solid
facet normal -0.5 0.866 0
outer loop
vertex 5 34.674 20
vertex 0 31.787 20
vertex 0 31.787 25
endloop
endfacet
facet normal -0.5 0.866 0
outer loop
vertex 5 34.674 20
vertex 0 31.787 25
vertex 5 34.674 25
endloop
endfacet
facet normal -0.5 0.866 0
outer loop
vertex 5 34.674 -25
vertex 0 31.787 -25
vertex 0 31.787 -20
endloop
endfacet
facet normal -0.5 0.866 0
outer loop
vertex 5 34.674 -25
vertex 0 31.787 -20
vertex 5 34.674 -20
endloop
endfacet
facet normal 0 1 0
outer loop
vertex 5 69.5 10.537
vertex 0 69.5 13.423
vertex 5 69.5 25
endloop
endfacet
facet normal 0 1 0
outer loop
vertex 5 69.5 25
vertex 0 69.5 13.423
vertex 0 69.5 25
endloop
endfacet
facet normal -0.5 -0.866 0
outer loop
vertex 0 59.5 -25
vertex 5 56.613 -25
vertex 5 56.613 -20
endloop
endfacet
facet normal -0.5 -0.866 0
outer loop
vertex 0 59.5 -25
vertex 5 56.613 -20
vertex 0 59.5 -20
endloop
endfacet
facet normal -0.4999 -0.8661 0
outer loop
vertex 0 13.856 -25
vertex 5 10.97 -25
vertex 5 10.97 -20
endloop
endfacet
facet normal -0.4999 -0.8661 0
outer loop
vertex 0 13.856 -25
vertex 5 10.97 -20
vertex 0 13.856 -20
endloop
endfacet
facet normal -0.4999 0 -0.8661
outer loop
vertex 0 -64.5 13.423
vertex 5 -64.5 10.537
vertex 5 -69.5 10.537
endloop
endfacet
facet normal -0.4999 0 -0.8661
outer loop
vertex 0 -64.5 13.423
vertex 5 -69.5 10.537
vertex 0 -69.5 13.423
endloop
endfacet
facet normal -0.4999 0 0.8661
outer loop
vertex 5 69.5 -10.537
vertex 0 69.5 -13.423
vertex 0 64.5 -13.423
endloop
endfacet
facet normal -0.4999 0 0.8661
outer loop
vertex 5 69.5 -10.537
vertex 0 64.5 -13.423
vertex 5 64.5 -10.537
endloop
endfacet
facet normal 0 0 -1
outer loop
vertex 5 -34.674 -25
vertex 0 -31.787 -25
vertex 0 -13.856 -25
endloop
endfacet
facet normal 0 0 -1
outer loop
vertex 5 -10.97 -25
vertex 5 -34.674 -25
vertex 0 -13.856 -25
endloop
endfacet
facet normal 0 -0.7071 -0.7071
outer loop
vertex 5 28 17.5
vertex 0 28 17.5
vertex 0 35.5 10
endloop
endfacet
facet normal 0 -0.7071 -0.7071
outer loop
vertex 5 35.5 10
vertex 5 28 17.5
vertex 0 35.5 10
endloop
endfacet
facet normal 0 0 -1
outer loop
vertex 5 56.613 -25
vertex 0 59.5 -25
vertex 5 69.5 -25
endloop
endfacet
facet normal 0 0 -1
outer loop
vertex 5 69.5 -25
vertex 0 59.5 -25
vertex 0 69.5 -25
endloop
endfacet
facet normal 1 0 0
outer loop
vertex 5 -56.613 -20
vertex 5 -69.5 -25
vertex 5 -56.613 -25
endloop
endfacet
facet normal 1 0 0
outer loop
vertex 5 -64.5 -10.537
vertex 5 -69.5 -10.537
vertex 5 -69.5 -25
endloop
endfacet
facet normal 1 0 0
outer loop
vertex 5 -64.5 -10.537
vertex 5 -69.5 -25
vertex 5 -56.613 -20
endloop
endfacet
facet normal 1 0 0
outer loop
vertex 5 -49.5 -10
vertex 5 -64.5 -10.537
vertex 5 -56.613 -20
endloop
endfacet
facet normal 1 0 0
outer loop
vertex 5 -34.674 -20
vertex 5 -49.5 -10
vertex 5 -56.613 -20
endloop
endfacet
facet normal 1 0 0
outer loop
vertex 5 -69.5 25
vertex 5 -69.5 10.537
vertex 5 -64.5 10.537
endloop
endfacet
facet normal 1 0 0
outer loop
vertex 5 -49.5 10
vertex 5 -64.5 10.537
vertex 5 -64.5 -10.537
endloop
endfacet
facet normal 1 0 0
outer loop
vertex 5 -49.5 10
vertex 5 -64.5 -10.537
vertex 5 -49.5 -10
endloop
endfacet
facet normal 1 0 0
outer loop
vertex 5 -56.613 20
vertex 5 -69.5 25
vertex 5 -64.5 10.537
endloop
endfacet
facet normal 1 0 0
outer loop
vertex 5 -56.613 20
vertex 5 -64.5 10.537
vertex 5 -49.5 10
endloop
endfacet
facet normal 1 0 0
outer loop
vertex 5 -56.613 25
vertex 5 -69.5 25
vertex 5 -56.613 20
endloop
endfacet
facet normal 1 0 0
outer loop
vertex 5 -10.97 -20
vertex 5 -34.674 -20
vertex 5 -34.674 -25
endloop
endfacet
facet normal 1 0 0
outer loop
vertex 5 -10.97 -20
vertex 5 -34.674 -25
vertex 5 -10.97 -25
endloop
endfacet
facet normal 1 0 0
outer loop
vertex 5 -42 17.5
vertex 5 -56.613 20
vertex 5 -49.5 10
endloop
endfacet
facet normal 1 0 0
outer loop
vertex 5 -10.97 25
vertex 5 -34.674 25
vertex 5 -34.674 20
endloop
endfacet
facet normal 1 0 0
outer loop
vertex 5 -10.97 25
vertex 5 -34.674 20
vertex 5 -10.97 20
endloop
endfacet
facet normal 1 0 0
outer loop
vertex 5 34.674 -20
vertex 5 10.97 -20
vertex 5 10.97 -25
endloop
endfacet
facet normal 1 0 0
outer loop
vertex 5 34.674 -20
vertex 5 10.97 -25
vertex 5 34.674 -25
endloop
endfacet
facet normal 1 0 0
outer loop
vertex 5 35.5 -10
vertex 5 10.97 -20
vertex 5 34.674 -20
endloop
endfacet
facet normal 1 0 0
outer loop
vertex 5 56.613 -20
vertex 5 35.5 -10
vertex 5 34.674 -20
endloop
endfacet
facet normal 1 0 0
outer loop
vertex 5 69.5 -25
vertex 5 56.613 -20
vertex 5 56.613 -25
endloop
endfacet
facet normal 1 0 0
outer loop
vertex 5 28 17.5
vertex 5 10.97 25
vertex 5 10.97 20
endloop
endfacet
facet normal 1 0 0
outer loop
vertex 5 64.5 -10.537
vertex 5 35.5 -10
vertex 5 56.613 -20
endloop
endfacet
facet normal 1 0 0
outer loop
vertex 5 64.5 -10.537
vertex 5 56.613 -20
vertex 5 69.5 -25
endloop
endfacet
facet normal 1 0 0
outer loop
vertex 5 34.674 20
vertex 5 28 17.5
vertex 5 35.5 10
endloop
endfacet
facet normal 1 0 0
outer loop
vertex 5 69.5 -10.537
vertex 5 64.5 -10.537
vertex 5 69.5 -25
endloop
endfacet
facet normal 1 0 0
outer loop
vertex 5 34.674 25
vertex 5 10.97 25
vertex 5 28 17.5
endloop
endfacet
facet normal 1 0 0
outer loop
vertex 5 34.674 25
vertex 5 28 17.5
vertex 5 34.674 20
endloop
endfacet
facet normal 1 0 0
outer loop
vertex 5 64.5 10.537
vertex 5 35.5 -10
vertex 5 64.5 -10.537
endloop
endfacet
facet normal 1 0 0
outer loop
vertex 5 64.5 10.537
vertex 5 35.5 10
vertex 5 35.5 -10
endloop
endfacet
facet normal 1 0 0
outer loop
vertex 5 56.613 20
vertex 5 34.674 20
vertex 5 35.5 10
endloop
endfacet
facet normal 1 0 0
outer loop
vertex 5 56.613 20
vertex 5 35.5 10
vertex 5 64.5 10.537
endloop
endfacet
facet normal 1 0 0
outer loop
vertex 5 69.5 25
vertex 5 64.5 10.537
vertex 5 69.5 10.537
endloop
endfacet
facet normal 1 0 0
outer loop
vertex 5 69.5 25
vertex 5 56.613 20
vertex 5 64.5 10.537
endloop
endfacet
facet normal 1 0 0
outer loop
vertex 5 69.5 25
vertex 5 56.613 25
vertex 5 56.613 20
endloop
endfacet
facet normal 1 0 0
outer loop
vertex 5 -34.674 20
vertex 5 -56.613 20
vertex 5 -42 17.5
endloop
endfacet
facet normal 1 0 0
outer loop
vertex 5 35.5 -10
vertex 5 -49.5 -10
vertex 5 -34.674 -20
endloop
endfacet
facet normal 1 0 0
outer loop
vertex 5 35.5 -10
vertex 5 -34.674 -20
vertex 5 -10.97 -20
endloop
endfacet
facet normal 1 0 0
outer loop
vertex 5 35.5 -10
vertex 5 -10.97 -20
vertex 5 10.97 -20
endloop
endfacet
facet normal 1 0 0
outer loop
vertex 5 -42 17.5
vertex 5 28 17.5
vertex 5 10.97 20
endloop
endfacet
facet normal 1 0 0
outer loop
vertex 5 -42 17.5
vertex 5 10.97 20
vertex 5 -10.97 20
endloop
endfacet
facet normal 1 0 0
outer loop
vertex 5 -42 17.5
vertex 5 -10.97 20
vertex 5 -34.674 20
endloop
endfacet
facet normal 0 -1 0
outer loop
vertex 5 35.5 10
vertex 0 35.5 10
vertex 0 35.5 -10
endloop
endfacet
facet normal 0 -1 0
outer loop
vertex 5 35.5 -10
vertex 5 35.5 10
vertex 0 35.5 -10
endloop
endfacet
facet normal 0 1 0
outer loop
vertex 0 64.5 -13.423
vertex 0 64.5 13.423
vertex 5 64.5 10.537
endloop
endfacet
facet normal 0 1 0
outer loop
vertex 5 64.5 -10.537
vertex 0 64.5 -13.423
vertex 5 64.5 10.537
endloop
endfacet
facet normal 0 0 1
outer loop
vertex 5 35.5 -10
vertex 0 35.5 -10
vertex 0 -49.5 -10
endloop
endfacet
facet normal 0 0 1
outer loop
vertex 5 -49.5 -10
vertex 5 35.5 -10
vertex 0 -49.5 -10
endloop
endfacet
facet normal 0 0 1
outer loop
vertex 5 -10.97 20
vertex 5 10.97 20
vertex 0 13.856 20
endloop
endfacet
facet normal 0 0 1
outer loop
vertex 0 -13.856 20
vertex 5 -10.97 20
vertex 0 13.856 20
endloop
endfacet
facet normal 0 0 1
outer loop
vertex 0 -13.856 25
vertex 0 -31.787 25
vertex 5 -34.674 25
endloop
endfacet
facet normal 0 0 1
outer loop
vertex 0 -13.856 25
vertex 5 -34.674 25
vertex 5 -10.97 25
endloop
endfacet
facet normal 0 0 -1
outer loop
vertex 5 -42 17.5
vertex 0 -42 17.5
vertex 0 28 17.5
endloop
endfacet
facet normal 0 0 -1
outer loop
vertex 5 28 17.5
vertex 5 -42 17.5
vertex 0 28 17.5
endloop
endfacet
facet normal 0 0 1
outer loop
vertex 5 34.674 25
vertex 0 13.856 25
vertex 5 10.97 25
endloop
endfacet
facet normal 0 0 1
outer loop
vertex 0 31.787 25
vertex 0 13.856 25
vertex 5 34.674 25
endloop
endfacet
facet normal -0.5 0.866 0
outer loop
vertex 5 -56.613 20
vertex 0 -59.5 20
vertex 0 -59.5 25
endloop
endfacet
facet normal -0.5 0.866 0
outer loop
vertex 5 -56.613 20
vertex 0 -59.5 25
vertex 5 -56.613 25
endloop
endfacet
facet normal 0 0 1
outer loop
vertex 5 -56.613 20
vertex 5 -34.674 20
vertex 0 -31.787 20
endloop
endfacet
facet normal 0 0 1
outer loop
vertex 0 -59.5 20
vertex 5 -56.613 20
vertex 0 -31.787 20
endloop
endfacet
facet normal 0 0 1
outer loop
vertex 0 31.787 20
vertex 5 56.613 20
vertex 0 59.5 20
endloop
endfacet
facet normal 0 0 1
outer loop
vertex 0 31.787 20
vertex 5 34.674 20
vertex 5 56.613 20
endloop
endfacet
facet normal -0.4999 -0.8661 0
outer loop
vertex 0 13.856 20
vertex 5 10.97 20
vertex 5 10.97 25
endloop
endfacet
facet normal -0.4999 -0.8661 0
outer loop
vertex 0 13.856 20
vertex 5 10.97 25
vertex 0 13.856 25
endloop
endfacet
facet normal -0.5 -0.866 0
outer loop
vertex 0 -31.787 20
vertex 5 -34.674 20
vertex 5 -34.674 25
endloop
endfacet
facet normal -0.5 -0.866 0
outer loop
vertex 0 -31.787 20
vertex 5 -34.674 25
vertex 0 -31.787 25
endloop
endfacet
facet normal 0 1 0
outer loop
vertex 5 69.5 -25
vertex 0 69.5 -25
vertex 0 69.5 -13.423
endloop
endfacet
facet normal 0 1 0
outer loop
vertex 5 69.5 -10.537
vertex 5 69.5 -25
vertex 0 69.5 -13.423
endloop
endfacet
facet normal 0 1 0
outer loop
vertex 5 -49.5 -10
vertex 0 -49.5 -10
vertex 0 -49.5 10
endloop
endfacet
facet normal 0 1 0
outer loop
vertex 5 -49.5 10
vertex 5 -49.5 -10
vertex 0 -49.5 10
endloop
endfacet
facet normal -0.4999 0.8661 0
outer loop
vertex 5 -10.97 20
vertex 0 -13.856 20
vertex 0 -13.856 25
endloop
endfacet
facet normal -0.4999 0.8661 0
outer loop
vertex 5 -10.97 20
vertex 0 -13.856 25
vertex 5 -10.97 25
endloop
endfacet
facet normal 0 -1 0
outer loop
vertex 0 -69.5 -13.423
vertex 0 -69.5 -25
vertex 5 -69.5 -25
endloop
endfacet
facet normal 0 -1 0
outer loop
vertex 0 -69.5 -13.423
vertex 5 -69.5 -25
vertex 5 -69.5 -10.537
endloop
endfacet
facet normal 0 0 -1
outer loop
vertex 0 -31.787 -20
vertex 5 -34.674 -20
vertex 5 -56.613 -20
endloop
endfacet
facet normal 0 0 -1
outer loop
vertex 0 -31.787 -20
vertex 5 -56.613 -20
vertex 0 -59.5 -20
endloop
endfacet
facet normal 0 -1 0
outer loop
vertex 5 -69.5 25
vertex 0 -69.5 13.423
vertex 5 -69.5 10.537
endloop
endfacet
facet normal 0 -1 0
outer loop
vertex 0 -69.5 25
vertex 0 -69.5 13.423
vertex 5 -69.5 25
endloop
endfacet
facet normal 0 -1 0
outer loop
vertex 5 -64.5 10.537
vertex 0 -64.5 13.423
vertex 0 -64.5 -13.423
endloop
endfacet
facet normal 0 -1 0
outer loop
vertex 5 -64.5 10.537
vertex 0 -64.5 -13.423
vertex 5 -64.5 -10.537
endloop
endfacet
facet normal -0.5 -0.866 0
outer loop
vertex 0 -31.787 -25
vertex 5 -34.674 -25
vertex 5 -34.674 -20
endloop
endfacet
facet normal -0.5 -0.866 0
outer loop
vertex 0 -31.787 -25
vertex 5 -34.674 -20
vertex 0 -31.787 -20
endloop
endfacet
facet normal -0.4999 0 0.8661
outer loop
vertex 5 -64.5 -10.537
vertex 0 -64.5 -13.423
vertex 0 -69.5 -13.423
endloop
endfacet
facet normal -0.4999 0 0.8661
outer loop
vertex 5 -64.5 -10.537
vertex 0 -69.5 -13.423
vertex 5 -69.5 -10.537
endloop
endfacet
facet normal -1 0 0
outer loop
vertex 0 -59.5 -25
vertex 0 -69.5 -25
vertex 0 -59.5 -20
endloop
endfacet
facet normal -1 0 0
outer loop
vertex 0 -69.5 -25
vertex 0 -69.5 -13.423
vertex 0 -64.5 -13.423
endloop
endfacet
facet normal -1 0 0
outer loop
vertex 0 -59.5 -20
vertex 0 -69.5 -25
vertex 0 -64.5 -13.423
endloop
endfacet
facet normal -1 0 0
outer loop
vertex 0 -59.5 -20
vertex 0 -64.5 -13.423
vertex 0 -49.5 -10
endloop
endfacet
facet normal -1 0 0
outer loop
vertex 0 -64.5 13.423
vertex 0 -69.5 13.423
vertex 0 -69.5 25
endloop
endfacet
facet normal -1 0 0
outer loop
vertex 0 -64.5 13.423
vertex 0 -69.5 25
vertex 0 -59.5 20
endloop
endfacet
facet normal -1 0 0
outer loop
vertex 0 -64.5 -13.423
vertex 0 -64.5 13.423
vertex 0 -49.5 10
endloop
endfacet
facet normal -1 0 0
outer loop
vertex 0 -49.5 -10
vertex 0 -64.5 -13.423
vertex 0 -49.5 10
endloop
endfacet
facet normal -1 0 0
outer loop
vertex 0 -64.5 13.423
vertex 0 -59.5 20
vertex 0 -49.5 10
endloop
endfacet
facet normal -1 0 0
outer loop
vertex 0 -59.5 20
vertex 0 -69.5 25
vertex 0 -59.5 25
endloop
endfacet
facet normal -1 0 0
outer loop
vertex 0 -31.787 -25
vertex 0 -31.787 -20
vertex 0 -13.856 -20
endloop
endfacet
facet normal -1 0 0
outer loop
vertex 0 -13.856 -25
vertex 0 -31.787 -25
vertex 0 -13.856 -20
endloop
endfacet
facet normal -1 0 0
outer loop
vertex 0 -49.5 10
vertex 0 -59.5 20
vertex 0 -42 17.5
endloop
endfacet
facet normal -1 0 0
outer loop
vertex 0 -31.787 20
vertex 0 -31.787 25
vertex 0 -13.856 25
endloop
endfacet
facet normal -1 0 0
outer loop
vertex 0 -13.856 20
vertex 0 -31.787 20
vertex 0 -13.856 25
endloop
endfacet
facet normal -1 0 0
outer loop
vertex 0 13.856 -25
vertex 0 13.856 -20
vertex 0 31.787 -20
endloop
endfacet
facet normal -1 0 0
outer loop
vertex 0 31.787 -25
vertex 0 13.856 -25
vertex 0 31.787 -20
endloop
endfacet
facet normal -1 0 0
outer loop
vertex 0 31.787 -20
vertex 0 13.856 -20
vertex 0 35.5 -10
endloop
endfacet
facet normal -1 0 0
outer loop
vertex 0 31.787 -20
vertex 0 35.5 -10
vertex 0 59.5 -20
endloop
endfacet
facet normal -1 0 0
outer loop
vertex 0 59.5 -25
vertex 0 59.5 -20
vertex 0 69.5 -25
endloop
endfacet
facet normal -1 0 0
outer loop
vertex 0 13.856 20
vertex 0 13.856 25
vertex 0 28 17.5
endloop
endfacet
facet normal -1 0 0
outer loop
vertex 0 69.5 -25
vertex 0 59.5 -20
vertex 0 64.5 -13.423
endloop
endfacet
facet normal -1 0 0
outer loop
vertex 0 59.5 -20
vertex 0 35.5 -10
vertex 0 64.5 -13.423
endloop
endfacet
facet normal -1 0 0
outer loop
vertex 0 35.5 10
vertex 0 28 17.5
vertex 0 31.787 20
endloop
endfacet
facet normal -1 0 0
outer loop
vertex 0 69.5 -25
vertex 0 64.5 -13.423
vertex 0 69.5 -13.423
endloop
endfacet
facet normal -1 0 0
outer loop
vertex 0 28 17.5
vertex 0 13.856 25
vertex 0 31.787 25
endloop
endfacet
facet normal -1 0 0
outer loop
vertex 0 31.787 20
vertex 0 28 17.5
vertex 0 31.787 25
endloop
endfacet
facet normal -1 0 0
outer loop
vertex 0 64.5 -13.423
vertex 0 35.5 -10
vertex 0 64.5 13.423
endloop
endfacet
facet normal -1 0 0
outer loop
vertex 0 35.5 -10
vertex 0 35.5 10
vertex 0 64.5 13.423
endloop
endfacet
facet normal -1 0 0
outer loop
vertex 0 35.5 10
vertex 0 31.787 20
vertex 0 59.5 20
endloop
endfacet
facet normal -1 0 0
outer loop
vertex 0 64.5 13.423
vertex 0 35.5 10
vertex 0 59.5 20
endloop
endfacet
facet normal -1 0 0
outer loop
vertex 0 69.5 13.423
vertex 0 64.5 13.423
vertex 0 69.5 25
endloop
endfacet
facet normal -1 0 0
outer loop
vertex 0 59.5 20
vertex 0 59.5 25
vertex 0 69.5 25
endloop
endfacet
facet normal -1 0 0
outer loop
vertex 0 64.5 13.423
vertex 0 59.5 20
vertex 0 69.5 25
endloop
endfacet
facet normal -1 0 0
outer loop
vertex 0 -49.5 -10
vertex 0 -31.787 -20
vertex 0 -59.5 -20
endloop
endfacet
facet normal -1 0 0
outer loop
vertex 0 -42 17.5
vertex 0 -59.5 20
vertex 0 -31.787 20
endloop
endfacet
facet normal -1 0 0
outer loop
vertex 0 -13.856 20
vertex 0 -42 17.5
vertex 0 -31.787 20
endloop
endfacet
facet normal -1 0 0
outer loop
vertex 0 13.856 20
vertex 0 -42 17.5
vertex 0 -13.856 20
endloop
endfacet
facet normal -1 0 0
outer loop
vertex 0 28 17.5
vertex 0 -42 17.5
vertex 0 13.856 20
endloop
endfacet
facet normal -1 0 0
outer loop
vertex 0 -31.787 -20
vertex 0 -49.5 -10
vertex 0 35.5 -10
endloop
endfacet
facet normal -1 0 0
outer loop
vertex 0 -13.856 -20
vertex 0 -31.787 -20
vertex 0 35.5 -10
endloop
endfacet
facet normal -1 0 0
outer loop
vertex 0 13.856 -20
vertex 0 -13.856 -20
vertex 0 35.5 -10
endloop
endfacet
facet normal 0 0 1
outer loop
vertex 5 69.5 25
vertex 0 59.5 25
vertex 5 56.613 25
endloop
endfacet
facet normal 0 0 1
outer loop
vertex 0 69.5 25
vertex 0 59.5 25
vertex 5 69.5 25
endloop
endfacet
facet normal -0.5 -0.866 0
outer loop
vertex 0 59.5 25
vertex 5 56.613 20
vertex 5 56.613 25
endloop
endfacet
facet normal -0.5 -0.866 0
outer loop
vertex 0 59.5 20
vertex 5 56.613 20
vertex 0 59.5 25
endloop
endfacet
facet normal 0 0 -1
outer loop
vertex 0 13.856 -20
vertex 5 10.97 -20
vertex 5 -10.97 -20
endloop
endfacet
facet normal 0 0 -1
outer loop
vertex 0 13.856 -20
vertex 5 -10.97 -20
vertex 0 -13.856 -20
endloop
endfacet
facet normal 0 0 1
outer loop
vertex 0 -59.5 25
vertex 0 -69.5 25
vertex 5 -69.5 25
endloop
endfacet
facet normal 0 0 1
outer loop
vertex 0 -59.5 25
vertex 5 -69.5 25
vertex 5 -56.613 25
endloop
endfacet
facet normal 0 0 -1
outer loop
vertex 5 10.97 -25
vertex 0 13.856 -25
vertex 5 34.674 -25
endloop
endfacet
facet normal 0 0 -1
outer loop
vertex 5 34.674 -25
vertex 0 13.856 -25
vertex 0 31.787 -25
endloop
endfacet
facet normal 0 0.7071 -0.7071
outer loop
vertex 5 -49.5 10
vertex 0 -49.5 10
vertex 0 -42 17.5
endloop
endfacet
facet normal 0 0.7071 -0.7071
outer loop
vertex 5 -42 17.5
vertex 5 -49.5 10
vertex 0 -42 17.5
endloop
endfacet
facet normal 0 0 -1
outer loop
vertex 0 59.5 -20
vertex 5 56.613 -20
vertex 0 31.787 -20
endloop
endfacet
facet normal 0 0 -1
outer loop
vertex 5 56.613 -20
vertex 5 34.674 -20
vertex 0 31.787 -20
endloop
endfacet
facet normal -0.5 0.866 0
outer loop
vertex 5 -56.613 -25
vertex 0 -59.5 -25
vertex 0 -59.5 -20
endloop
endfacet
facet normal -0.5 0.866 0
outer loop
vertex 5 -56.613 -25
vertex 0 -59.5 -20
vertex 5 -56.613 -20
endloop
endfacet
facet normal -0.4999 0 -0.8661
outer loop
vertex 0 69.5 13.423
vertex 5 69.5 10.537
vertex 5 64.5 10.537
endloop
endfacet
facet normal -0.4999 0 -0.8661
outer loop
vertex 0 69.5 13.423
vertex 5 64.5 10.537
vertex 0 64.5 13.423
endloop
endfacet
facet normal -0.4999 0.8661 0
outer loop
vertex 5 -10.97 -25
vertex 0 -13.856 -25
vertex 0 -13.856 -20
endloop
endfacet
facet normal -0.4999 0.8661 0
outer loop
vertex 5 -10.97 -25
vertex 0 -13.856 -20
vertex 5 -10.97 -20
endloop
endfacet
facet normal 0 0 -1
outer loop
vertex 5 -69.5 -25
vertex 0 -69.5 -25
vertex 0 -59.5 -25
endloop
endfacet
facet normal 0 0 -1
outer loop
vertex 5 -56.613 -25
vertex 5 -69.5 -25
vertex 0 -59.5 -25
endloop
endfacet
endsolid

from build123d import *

# Parameters (mm, degrees)
SKETCH2_W           = 139
SKETCH2_H           = 50
BOSS_EXTRUDE1_DEPTH = 5
CUT_EXTRUDE1_DEPTH  = 5
CUT_EXTRUDE2_START  = -45
CUT_EXTRUDE2_DEPTH  = 5
CUT_EXTRUDE3_DEPTH  = 5
CUT_EXTRUDE5_START  = -134
CUT_EXTRUDE5_DEPTH  = 5
CUT_EXTRUDE6_DEPTH  = 5


with BuildPart() as part:
    # Sketch2 → Boss-Extrude1 (new body)
    with BuildSketch(Plane.YZ):
        Rectangle(SKETCH2_W, SKETCH2_H)
    extrude(amount=BOSS_EXTRUDE1_DEPTH)

    # Sketch3 → Cut-Extrude1 (cut)
    with BuildSketch(Plane(origin=(0, 0, -25), x_dir=(1, 0, 0), z_dir=(0, 0, -1))):
        Polygon((0, 31.787187079), (0, 59.5), (24, 45.643593539), align=None)
        Polygon((0, -13.856406461), (0, 13.856406461), (24, 0), align=None)
        Polygon((0, -59.5), (0, -31.787187079), (24, -45.643593539), align=None)
    extrude(amount=-CUT_EXTRUDE1_DEPTH, mode=Mode.SUBTRACT)

    # Sketch3<3> → Cut-Extrude2 (cut)
    with BuildSketch(Plane(origin=(0, 0, -25), x_dir=(1, 0, 0), z_dir=(0, 0, -1)).offset(CUT_EXTRUDE2_START)):
        Polygon((0, 31.787187079), (0, 59.5), (24, 45.643593539), align=None)
        Polygon((0, -13.856406461), (0, 13.856406461), (24, 0), align=None)
        Polygon((0, -59.5), (0, -31.787187079), (24, -45.643593539), align=None)
    extrude(amount=-CUT_EXTRUDE2_DEPTH, mode=Mode.SUBTRACT)

    # Sketch6 → Cut-Extrude3 (cut)
    with BuildSketch(Plane(origin=(0, 69.5, 0), x_dir=(-1, 0, 0), z_dir=(0, 1, 0))):
        Polygon((0, 13.423393759), (0, -13.423393759), (-23.25, 0), align=None)
    extrude(amount=-CUT_EXTRUDE3_DEPTH, mode=Mode.SUBTRACT)

    # Sketch6<3> → Cut-Extrude5 (cut)
    with BuildSketch(Plane(origin=(0, 69.5, 0), x_dir=(-1, 0, 0), z_dir=(0, 1, 0)).offset(CUT_EXTRUDE5_START)):
        Polygon((0, 13.423393759), (0, -13.423393759), (-23.25, 0), align=None)
    extrude(amount=-CUT_EXTRUDE5_DEPTH, mode=Mode.SUBTRACT)

    # Sketch4 → Cut-Extrude6 (cut)
    with BuildSketch(Plane(origin=(0, 0, 0), x_dir=(0, -1, 0), z_dir=(-1, 0, 0))):
        Polygon((-35.5, -10), (49.5, -10), (49.5, 10), (42, 17.5), (-28, 17.5), (-35.5, 10), align=None)
    extrude(amount=-CUT_EXTRUDE6_DEPTH, mode=Mode.SUBTRACT)


solid = part.part
